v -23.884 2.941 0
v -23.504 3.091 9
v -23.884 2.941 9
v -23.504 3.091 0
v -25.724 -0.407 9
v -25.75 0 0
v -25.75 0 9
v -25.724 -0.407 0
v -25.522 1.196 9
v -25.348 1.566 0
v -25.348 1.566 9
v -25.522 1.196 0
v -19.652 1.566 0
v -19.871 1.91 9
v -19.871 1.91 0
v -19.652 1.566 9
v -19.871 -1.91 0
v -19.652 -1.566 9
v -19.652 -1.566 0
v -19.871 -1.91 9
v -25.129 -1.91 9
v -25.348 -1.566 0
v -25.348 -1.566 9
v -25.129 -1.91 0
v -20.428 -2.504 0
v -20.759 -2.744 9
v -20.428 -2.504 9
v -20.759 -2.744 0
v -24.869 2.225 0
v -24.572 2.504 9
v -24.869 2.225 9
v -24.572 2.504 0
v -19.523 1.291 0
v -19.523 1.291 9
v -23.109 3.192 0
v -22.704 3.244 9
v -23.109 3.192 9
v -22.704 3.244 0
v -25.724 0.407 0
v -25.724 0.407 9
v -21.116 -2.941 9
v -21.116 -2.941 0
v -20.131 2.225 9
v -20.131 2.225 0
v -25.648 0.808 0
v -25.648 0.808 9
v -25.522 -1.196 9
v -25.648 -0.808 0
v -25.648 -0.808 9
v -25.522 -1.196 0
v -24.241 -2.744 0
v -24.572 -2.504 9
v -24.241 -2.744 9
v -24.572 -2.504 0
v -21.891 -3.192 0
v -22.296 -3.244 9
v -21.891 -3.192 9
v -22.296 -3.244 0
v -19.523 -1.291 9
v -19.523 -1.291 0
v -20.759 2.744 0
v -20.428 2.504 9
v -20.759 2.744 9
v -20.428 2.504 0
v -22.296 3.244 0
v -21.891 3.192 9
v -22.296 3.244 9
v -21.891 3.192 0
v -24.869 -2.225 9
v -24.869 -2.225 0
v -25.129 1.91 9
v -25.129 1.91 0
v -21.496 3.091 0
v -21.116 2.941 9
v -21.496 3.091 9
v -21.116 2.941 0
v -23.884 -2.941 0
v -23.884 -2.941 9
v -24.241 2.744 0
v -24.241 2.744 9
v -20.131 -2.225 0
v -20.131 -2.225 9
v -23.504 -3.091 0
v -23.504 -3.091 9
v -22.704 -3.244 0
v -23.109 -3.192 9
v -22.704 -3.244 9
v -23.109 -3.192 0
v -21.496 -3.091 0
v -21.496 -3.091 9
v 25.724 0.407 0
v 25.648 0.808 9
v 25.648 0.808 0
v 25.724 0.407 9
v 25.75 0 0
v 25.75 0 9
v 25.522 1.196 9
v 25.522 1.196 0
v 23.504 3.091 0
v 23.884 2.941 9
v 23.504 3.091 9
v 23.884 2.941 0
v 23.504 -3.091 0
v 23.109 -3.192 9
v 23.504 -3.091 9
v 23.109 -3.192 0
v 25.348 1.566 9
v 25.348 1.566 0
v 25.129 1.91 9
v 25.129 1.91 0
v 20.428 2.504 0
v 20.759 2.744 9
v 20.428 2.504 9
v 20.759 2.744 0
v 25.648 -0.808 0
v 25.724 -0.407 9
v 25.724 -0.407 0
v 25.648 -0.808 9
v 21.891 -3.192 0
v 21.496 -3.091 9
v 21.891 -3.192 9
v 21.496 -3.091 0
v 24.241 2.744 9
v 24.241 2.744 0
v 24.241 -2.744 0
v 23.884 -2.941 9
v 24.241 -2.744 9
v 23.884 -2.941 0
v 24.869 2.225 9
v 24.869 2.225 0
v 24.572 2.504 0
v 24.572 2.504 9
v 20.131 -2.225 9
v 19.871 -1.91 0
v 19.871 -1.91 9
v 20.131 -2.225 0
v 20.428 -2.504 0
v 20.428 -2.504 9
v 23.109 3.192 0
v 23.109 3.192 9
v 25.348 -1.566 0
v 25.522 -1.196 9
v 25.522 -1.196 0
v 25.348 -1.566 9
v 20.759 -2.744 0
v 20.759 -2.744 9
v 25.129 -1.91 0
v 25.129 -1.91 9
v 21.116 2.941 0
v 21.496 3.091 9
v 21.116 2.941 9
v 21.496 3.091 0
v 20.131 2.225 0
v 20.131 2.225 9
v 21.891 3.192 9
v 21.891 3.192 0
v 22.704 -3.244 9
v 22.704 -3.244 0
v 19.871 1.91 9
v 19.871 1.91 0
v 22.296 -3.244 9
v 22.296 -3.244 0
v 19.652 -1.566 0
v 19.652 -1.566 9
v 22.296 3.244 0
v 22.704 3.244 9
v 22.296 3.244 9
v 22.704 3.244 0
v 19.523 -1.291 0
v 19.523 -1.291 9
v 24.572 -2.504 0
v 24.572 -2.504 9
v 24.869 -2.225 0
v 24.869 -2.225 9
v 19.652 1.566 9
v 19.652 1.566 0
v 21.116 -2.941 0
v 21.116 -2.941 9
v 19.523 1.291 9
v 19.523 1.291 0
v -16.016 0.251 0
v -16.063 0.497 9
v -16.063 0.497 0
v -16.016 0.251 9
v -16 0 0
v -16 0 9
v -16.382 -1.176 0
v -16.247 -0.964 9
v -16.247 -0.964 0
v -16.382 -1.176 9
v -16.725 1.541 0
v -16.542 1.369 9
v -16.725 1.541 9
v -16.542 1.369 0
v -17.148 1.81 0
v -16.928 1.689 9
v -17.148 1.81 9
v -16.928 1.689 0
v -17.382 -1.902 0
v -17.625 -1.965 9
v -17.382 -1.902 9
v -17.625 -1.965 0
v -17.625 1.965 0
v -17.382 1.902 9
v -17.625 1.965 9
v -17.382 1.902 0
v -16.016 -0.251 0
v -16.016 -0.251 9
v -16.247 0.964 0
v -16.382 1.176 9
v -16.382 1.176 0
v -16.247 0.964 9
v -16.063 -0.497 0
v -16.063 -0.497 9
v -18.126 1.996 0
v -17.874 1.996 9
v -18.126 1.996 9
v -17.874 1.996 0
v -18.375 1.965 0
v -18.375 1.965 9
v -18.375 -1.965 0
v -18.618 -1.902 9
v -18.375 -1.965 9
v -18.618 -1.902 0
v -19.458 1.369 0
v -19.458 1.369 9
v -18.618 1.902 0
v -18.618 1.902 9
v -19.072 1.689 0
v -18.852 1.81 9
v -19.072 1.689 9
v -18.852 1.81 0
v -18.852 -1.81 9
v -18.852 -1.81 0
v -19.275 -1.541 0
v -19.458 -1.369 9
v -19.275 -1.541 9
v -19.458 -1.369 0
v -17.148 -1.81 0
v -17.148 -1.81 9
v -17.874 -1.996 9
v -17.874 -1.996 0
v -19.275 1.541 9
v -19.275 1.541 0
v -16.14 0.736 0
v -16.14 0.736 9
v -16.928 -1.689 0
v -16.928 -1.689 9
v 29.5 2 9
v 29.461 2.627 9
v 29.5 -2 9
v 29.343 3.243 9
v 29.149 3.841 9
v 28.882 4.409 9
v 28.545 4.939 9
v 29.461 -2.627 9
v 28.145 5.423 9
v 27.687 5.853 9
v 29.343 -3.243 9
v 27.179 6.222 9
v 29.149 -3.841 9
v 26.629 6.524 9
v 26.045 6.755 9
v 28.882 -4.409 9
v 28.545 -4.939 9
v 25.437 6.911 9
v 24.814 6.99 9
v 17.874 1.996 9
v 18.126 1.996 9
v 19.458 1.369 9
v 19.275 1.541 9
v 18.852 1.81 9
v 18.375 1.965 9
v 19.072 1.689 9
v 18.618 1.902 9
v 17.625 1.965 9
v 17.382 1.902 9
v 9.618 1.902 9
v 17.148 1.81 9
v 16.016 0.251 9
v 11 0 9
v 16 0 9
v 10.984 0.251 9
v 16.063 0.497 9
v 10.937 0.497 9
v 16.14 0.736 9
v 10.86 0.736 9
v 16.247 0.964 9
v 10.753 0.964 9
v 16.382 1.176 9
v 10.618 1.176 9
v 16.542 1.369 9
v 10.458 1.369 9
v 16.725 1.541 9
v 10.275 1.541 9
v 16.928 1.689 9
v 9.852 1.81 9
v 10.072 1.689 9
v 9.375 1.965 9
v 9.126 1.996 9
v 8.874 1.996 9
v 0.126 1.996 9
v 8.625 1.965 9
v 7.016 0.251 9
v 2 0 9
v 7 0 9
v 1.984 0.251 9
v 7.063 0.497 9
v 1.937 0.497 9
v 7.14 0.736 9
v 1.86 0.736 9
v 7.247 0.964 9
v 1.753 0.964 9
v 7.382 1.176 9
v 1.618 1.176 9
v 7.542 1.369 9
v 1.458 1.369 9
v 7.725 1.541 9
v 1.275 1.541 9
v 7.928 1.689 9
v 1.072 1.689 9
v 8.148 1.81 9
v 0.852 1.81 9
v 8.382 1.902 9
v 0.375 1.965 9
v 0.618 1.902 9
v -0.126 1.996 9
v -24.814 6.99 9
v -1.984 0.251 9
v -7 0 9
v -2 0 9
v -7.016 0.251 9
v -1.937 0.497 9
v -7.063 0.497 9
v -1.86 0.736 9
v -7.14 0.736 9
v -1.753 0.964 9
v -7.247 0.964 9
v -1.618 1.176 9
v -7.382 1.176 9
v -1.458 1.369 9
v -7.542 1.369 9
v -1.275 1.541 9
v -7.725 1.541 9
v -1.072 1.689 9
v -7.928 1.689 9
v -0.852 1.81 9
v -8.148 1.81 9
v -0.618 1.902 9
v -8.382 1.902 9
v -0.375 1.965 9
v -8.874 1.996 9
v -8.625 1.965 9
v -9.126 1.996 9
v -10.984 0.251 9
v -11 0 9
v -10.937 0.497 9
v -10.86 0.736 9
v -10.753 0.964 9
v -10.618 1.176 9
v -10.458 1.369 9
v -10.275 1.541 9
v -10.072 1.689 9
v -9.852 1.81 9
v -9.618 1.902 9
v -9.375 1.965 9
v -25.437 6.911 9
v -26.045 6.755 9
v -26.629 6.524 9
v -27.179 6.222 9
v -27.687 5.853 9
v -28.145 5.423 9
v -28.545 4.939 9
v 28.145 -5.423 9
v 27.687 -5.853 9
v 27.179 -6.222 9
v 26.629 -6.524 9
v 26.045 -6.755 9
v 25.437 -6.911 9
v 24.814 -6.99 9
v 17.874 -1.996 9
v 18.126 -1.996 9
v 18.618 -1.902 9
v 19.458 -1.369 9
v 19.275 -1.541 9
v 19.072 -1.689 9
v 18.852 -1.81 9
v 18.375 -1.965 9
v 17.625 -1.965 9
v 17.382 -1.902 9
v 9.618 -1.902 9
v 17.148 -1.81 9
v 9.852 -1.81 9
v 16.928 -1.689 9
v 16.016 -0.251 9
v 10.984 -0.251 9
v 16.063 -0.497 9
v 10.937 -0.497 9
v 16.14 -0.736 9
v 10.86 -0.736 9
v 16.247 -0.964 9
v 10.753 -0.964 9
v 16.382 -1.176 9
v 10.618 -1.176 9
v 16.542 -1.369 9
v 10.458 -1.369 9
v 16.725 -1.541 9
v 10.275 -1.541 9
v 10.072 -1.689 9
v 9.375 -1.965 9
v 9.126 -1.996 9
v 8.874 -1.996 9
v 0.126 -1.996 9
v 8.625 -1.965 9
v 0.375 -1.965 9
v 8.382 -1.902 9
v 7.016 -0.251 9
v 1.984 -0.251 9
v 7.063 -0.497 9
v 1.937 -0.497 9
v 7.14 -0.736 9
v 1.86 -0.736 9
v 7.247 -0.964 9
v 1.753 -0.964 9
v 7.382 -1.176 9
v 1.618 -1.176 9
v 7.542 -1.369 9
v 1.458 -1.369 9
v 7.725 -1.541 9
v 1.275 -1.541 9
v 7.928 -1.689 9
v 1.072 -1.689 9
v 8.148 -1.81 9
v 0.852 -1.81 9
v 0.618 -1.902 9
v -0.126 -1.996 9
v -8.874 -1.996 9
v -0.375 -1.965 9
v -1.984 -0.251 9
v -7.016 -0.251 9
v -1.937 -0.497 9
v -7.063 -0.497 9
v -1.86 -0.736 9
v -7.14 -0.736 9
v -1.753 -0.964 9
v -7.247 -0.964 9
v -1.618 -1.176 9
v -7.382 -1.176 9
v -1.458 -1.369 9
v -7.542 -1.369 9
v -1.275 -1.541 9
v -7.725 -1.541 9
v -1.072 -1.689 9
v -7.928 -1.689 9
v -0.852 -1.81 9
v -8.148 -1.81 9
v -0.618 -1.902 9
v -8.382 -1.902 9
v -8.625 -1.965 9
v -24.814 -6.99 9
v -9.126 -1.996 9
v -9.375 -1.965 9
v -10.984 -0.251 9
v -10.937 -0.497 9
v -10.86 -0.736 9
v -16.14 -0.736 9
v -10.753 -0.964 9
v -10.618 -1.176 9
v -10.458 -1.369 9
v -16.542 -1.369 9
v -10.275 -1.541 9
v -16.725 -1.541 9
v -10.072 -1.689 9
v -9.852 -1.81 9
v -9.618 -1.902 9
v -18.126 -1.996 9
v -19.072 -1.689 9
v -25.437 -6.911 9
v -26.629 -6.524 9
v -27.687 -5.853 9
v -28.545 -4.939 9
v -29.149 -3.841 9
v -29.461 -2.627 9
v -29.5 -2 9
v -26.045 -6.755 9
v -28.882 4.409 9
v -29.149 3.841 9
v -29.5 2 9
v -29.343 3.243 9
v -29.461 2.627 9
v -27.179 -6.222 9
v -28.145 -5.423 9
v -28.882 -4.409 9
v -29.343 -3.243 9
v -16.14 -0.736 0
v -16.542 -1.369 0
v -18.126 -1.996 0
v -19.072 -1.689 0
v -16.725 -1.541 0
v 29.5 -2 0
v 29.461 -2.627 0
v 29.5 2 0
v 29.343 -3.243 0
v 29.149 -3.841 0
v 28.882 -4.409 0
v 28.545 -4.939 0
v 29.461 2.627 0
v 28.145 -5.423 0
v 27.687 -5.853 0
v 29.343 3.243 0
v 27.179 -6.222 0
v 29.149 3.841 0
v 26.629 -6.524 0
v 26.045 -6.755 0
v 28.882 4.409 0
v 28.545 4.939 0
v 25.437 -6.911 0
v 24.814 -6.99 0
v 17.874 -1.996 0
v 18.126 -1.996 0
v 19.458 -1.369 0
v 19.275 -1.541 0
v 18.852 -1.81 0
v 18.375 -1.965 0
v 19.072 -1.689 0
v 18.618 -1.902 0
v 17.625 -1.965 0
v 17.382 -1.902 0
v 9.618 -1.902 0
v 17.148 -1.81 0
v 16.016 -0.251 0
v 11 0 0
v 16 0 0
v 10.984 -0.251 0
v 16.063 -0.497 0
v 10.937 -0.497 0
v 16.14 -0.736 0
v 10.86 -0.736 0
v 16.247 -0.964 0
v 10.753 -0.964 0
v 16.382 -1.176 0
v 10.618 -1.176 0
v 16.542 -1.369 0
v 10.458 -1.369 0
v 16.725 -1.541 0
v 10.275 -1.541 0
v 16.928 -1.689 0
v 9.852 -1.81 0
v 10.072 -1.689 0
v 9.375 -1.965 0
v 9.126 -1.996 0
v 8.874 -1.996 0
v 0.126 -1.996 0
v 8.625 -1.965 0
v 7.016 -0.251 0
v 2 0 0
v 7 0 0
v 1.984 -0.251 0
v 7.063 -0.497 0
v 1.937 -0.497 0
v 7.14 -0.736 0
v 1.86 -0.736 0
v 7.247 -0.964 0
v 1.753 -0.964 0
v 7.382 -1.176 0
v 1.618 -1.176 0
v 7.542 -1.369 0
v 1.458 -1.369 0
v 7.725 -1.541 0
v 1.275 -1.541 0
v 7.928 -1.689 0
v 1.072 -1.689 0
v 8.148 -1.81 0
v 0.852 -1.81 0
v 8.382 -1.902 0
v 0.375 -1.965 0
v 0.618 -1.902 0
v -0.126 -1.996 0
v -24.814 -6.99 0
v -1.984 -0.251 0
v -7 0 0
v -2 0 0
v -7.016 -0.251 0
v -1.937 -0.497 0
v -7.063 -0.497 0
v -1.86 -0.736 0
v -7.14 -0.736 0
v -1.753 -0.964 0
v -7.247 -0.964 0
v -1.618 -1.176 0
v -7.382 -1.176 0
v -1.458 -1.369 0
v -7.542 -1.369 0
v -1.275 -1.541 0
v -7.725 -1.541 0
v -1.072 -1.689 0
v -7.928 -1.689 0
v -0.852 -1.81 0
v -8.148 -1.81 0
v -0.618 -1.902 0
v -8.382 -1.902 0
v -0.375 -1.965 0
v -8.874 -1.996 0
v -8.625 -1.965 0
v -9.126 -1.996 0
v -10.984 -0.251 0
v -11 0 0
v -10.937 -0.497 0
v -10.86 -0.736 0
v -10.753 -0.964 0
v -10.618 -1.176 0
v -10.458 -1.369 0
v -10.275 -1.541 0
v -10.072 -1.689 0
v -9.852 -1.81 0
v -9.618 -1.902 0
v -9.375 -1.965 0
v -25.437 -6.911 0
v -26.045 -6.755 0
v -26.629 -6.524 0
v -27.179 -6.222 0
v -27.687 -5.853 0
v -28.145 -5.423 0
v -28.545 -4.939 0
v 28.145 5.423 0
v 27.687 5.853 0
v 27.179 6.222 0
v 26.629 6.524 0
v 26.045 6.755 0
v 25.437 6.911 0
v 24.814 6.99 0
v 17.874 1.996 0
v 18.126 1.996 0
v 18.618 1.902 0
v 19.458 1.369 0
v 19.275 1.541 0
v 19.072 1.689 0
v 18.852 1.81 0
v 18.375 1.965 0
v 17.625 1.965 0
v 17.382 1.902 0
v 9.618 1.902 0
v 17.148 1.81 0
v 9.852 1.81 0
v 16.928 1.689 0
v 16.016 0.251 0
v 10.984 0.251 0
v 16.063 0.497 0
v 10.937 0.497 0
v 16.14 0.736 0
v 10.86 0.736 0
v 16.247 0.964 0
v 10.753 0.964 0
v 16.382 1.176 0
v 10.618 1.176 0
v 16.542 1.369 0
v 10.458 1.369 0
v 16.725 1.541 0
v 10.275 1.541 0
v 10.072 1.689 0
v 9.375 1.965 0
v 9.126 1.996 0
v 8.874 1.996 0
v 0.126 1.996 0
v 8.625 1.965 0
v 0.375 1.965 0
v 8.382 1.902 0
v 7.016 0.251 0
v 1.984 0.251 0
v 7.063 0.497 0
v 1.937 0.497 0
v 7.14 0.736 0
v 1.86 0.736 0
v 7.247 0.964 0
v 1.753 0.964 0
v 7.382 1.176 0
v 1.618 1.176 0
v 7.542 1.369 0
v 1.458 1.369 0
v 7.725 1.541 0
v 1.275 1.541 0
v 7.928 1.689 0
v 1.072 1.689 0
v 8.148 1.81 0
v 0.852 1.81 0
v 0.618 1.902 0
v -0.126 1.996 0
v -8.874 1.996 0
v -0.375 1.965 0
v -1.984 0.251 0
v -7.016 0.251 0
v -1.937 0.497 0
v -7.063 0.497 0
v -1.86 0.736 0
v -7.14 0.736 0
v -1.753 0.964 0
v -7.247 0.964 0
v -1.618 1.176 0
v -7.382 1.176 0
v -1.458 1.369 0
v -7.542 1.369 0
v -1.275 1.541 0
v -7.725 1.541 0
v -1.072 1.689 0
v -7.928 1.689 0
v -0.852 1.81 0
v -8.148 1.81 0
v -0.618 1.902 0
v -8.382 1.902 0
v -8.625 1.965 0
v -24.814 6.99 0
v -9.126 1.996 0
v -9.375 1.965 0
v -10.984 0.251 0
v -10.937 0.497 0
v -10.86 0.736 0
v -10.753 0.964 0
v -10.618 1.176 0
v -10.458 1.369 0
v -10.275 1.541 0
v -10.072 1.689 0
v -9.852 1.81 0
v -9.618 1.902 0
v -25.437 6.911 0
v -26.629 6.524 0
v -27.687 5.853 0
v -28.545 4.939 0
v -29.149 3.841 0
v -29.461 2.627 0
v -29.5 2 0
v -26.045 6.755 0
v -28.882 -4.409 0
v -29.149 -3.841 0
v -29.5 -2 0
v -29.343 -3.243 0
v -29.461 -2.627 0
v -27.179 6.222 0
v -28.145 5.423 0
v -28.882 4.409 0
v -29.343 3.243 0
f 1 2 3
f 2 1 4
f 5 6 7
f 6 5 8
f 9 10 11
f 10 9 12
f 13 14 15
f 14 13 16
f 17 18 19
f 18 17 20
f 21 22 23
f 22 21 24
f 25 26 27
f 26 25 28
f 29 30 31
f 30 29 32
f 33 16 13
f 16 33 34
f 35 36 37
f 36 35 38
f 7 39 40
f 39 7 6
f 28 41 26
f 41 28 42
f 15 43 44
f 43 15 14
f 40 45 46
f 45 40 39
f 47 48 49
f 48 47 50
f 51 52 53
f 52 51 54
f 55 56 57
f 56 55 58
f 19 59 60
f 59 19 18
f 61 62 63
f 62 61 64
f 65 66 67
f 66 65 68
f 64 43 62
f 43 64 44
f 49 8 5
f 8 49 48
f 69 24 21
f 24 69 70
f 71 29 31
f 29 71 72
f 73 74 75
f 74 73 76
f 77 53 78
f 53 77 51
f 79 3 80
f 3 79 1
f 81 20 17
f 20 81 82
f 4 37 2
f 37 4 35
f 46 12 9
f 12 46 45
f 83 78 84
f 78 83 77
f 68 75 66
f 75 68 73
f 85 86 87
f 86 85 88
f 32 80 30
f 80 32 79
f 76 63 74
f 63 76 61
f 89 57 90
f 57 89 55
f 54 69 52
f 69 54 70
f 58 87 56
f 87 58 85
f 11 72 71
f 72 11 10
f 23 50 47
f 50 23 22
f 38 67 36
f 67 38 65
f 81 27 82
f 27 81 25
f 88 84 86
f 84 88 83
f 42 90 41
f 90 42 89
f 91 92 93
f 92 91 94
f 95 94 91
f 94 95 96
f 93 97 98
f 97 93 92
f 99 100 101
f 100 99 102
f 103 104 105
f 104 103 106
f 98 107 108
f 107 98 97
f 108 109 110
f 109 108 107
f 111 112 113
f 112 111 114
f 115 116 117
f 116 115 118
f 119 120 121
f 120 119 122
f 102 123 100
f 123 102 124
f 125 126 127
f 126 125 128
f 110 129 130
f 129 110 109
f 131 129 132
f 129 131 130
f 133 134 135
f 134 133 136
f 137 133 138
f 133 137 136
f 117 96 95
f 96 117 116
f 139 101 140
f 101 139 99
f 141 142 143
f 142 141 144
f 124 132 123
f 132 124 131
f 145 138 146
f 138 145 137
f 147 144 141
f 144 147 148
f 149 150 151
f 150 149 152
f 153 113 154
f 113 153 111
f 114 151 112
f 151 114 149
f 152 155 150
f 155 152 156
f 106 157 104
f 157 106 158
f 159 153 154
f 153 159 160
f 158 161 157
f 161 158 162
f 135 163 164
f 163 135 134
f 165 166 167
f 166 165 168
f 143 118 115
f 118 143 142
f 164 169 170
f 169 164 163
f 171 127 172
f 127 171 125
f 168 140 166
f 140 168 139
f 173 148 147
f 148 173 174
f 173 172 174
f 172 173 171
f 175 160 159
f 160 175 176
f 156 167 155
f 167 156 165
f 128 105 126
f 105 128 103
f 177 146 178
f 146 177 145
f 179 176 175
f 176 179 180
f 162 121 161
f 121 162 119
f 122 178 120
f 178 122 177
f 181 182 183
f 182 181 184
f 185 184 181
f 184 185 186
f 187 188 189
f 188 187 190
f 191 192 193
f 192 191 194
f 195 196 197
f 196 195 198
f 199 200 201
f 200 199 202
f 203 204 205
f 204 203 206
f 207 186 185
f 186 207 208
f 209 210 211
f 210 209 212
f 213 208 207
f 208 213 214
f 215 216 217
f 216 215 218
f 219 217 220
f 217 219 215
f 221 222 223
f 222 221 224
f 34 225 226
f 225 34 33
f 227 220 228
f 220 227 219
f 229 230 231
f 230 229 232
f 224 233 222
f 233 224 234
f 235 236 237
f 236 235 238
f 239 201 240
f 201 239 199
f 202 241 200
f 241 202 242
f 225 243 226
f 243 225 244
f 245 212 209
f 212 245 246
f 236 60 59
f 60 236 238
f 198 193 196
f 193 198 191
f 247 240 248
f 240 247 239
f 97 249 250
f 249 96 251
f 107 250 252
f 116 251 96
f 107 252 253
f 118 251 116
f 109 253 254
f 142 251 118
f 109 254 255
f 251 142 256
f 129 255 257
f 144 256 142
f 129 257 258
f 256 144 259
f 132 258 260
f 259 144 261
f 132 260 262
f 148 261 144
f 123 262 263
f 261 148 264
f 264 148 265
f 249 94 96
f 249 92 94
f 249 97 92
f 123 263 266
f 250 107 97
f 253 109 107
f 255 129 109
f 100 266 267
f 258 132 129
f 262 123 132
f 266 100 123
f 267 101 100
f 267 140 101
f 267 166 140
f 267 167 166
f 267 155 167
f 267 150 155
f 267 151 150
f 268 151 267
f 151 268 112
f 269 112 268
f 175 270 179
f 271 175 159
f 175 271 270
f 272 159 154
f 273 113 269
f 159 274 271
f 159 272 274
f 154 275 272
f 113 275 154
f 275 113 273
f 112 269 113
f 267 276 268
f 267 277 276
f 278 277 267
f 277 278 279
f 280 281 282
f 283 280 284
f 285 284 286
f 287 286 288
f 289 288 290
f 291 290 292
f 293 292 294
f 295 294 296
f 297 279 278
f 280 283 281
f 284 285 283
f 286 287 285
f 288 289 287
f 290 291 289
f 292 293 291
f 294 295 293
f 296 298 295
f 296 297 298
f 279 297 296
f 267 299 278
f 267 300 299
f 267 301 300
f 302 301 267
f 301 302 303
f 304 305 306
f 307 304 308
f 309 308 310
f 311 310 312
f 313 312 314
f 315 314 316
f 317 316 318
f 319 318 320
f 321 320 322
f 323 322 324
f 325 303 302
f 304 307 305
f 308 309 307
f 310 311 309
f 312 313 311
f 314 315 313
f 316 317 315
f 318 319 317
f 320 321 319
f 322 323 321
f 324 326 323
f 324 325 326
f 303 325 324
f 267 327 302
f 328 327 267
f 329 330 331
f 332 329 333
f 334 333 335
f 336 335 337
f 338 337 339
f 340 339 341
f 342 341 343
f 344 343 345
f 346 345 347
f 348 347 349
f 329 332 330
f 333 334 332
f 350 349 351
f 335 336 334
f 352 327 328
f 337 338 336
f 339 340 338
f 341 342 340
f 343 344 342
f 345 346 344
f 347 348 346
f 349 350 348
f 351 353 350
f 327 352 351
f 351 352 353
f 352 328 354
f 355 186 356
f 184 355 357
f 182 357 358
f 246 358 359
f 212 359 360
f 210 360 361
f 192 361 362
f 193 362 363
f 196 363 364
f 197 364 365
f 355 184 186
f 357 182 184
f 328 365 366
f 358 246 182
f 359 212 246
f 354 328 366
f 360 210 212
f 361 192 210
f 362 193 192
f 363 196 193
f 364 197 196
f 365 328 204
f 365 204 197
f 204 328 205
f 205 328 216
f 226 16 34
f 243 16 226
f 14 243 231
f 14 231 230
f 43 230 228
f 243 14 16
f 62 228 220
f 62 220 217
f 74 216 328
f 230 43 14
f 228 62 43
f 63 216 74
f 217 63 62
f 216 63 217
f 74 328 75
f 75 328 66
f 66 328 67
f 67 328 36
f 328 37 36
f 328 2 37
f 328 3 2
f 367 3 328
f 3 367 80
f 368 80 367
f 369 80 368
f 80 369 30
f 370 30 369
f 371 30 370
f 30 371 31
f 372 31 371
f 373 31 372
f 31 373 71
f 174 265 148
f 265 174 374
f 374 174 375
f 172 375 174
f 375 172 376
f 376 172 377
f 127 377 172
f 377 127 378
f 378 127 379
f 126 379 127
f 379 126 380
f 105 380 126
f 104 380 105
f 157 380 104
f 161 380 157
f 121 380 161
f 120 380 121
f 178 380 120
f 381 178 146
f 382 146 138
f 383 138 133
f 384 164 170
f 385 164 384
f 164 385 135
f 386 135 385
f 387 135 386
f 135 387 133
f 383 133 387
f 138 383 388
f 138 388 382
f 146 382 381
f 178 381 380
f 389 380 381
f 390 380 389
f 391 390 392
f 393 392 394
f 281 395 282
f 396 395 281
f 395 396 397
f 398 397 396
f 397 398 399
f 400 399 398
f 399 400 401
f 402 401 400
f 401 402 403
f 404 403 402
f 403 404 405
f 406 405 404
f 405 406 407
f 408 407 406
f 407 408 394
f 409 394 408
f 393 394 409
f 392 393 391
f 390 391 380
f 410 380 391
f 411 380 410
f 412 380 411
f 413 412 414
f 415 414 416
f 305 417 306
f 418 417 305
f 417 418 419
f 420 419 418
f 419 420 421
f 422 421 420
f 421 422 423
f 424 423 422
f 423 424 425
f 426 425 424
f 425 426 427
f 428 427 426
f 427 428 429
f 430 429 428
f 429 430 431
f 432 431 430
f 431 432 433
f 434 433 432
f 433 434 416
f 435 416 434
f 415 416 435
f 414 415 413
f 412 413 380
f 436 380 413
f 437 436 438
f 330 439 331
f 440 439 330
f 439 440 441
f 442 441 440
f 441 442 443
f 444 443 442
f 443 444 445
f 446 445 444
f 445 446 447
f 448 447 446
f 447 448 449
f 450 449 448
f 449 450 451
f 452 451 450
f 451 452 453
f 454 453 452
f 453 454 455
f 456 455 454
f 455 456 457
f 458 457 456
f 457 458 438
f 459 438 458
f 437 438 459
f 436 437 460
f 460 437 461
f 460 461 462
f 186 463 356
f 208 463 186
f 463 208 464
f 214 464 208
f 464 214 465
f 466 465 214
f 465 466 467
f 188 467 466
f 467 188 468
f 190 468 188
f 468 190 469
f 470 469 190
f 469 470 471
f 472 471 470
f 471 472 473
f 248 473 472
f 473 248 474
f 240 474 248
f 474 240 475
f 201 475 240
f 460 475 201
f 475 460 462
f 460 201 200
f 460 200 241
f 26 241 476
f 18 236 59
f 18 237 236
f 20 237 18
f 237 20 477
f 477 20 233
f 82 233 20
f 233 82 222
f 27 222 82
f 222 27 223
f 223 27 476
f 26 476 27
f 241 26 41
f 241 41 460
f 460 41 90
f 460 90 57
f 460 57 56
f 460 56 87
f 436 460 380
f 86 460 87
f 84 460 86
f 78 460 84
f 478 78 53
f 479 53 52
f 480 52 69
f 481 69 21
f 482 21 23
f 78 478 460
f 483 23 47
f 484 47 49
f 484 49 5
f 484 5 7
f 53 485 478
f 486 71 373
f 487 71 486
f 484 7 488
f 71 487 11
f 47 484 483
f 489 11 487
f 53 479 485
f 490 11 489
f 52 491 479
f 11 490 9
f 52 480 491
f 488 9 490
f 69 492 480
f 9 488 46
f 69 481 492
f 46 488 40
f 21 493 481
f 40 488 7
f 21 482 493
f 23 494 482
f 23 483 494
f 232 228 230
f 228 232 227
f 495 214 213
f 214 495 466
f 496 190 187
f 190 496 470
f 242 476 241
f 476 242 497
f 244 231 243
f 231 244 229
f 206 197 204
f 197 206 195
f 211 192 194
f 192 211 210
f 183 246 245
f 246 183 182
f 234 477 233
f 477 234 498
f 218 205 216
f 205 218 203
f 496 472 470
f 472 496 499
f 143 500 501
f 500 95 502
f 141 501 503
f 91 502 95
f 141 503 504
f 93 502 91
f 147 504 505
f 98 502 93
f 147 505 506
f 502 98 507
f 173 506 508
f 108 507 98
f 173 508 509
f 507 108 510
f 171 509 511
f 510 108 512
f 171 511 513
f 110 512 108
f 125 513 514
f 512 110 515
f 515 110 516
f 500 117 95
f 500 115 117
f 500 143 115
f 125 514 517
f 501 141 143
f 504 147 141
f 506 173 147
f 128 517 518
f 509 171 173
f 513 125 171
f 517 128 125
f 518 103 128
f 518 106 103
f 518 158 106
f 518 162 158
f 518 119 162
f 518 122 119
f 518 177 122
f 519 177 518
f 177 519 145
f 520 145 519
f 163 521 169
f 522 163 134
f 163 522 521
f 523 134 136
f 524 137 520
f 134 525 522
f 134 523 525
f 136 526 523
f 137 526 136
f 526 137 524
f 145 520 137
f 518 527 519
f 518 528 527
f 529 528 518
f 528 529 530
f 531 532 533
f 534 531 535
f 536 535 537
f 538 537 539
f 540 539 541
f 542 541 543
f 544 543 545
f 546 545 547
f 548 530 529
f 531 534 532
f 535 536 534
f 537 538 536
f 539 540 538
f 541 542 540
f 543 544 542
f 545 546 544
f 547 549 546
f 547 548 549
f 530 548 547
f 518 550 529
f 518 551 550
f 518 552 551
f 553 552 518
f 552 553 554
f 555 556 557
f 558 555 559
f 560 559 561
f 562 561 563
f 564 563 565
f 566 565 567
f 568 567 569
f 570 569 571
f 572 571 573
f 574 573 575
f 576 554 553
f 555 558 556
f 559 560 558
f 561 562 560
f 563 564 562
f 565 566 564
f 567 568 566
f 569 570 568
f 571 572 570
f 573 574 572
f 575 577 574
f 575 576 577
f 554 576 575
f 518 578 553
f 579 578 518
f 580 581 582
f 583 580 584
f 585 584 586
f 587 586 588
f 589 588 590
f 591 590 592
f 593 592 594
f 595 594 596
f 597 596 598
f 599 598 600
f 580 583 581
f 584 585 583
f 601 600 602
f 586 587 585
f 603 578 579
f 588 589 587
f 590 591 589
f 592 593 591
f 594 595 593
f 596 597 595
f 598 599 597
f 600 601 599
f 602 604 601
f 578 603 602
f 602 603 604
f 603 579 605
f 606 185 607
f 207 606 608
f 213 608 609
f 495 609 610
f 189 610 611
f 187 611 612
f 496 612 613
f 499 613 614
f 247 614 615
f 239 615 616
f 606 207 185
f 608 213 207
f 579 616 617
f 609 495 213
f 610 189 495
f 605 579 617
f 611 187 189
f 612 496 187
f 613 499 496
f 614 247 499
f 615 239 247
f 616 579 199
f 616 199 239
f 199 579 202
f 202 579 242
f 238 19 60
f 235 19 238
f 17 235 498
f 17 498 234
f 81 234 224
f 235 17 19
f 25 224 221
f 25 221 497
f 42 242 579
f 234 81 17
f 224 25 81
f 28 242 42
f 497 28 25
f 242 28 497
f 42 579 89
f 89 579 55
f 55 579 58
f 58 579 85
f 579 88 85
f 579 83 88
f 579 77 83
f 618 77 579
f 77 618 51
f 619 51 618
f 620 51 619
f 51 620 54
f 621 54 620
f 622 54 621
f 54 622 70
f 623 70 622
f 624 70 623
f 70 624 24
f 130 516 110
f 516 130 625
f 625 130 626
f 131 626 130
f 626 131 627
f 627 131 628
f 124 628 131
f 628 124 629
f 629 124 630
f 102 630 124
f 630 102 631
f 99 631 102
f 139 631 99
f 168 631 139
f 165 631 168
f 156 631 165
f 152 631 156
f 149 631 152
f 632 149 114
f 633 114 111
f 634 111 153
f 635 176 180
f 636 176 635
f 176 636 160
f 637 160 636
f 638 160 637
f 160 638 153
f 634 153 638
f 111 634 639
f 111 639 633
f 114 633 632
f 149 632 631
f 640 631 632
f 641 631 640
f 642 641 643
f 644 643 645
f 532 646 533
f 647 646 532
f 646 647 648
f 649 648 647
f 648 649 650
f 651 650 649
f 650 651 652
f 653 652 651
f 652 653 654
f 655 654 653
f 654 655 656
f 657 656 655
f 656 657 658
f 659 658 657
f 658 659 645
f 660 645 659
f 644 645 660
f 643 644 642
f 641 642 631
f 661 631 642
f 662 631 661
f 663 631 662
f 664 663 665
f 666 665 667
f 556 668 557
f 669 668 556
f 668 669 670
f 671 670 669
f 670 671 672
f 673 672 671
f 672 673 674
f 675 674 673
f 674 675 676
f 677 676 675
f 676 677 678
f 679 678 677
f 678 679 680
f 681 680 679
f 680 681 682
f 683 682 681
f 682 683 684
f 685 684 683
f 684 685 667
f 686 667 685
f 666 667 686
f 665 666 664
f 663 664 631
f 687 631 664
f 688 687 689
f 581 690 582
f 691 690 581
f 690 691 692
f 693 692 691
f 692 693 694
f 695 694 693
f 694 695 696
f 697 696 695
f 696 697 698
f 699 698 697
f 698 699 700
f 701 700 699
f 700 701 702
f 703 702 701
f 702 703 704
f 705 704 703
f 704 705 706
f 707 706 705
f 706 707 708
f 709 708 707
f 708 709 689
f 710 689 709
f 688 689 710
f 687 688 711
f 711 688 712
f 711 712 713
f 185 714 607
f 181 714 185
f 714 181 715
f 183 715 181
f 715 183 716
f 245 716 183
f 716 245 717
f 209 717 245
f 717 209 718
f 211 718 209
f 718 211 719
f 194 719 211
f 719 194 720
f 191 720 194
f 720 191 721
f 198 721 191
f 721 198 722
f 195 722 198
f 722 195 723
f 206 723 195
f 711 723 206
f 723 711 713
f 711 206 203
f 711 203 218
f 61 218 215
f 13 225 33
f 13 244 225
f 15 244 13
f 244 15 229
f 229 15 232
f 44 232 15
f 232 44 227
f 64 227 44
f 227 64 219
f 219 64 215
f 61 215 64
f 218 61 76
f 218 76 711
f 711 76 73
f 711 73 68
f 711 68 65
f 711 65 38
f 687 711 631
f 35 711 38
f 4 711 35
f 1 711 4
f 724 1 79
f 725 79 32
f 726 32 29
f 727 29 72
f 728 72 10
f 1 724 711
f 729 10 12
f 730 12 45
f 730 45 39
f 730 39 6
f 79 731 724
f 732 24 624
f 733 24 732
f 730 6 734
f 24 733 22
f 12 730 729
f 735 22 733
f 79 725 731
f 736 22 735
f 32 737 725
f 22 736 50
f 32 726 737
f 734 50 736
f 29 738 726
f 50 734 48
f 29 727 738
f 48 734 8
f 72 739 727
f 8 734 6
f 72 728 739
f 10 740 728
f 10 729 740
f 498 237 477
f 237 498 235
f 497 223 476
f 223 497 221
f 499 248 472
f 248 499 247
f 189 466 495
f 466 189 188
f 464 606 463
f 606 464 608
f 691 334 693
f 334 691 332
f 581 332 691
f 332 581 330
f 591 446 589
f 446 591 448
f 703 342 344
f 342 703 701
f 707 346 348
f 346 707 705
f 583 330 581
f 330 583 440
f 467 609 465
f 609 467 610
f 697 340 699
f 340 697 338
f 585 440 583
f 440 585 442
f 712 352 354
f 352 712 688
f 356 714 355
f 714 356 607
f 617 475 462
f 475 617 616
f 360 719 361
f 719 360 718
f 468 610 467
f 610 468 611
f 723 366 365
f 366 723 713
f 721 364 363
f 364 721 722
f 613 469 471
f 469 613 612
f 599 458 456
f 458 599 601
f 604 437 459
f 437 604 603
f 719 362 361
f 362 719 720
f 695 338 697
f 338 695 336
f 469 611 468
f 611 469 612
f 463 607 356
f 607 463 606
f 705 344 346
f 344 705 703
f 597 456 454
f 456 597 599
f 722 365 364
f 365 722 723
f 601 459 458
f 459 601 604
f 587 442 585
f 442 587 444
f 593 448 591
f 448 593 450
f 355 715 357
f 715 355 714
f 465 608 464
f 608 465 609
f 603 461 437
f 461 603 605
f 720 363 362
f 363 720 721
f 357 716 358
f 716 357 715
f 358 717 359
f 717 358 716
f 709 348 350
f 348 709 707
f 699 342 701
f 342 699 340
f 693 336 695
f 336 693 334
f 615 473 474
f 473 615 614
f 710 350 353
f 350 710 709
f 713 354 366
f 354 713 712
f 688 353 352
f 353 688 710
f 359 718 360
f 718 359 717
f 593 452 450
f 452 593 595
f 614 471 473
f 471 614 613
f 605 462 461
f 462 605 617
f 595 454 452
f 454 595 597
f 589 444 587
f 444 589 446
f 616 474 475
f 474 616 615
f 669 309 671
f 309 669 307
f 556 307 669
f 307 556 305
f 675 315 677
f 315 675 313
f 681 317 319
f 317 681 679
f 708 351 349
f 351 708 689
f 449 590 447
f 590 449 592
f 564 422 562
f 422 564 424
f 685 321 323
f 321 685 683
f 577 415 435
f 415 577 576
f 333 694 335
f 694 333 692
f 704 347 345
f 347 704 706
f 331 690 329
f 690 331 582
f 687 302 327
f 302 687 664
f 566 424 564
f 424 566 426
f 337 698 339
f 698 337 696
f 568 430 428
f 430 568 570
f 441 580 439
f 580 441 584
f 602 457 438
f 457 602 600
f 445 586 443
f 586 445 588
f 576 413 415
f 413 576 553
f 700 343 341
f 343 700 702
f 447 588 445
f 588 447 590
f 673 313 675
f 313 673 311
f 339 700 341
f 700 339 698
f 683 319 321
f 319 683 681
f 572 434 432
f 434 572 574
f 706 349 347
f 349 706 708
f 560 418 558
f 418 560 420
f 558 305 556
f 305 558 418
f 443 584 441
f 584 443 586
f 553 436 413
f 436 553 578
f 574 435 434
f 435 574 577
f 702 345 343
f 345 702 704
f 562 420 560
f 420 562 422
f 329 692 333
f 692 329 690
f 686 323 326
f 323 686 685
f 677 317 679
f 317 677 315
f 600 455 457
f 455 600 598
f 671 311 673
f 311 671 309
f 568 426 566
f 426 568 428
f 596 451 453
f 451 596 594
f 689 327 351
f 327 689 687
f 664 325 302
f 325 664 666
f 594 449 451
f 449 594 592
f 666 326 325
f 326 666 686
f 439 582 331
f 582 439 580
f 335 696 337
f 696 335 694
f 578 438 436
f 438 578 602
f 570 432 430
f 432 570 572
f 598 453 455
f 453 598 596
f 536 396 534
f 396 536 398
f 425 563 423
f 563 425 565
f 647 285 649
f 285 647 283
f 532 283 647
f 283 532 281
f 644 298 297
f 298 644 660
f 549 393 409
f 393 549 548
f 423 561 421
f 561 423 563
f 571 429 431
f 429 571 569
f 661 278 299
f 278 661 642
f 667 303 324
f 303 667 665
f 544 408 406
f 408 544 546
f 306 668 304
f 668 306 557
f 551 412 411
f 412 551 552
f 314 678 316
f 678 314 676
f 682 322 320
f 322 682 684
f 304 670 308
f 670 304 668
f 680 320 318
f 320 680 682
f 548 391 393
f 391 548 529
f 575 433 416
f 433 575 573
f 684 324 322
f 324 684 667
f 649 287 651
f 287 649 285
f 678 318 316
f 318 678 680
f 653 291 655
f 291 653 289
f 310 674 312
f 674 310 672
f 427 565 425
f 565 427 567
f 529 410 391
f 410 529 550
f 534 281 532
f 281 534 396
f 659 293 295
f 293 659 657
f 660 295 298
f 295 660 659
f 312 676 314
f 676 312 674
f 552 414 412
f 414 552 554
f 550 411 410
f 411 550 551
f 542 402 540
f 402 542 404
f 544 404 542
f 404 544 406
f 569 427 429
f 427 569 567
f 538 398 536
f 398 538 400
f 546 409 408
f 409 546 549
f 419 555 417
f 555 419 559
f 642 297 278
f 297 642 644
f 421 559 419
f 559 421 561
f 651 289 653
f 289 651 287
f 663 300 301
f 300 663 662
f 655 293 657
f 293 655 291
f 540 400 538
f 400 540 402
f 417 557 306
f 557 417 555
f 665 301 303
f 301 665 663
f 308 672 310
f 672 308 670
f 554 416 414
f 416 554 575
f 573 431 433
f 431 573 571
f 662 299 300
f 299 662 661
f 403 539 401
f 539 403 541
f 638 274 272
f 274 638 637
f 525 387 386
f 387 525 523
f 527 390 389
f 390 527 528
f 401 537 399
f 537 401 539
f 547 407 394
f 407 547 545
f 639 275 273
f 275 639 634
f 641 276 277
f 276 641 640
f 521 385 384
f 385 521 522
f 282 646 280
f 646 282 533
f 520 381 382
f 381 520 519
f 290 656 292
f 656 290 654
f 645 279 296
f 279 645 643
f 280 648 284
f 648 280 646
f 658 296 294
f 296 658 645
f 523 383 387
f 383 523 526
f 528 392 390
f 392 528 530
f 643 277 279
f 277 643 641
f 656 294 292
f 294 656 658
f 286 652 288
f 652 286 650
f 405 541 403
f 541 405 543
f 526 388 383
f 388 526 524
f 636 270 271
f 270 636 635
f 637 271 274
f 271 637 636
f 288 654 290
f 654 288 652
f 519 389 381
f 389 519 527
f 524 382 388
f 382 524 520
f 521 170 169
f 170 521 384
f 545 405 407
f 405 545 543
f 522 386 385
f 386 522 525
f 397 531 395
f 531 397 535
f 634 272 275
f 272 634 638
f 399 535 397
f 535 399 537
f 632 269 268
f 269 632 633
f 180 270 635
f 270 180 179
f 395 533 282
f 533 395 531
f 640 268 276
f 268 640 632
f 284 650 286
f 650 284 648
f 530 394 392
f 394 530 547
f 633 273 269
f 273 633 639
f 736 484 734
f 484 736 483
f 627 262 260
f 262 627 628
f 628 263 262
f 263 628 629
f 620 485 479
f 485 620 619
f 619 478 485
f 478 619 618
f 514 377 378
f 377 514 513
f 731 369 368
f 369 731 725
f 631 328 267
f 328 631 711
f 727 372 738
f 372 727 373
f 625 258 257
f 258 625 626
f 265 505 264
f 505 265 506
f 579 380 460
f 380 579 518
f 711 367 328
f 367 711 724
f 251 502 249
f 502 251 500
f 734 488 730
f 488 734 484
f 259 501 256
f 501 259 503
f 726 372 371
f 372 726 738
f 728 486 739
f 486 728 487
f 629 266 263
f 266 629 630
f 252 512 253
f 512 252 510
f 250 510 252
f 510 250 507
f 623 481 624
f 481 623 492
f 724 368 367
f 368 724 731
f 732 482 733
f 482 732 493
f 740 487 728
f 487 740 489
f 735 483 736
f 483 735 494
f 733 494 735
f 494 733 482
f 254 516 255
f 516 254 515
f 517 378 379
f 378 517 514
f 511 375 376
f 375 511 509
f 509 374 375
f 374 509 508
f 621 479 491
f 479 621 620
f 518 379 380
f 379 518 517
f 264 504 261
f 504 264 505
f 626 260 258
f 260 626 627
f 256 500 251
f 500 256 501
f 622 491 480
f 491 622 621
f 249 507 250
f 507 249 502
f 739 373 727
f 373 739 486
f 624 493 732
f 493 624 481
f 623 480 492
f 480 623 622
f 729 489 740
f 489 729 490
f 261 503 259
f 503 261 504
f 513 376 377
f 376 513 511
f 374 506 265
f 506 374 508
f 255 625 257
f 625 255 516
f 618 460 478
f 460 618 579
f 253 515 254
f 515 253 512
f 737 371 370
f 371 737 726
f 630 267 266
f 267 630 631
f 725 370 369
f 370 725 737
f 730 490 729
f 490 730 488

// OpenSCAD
$fn = 50;

difference() {
	union() {
		hull() {
			translate(v = [-24.5, 2.0, 0]) {
				cylinder(h = 9, r = 5);
			}
			translate(v = [24.5, 2.0, 0]) {
				cylinder(h = 9, r = 5);
			}
			translate(v = [-24.5, -2.0, 0]) {
				cylinder(h = 9, r = 5);
			}
			translate(v = [24.5, -2.0, 0]) {
				cylinder(h = 9, r = 5);
			}
		}
	}
	union() {
		translate(v = [-22.5, 0.0, -100.0]) {
			cylinder(h = 200, r = 3.25);
		}
		translate(v = [22.5, 0.0, -100.0]) {
			cylinder(h = 200, r = 3.25);
		}
		translate(v = [-22.5, 0.0, -100.0]) {
			cylinder(h = 200, r = 1.8);
		}
		translate(v = [22.5, 0.0, -100.0]) {
			cylinder(h = 200, r = 1.8);
		}
		translate(v = [-18.0, 0, 0.0]) {
			cylinder(h = 9, r = 2.0);
		}
		translate(v = [-9.0, 0, 0.0]) {
			cylinder(h = 9, r = 2.0);
		}
		cylinder(h = 9, r = 2.0);
		translate(v = [9.0, 0, 0.0]) {
			cylinder(h = 9, r = 2.0);
		}
		translate(v = [18.0, 0, 0.0]) {
			cylinder(h = 9, r = 2.0);
		}
	}
}
